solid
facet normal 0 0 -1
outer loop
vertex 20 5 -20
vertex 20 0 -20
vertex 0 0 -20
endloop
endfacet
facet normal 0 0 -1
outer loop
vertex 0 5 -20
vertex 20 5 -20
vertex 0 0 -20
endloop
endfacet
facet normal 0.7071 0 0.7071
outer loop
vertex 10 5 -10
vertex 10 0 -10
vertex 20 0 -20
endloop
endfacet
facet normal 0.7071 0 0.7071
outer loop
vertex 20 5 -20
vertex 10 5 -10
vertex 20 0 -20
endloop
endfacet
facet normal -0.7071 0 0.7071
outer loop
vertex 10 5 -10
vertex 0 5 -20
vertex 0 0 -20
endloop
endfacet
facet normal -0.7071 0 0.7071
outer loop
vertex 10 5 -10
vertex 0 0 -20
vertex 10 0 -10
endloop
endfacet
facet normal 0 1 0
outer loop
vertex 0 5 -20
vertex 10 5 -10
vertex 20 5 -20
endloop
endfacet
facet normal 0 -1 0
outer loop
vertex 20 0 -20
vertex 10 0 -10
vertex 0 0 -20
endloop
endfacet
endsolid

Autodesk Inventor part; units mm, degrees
ref_plane "YZ Plane" through (0, 0, 0) normal (1, 0, 0) x (0, 1, 0)
ref_plane "XZ Plane" through (0, 0, 0) normal (0, 1, 0) x (-1, 0, 0)
ref_plane "XY Plane" through (0, 0, 0) normal (0, 0, 1) x (1, 0, 0)
sketch "Szkic3" plane through (0, 0, 0) normal (0, 1, 0) x (-1, 0, 0)
  line L0 (0, 0) -> (-20, 0)
  line L1 (-20, 0) -> (-20, -20)
  line L2 (-20, -20) -> (0, -20)
  line L3 (0, -20) -> (0, 0)
  dimension "d6" = 20
  dimension "d7" = 20
extrude "Wyciągnięcie proste3" add sketch "Szkic3" along normal blind 5
sketch "Szkic4" plane through (0, 0, 0) normal (0, -1, 0) x (1, 0, 0)
  line L0 (0, 0) -> (20, 0) projected
  line L1 (20, 0) -> (20, -20) projected
  line L2 (0, 0) -> (20, -20)
  line L3 (20, -20) -> (20, 0)
  line L4 (20, 0) -> (0, 0)
extrude "Wyciągnięcie proste4" cut sketch "Szkic4" against normal blind 5
sketch "Szkic5" plane through (0, 5, 0) normal (0, 1, 0) x (1, 0, 0)
  line L0 (0, 20) -> (0, 0) projected
  line L1 (0, 20) -> (10.5726, 9.4274)
  line L2 (0, 0) -> (20, 20) projected
  line L3 (10.5726, 9.4274) -> (0, -1.1451)
  line L4 (20, 20) -> (0, 20) projected
  line L5 (0, -1.1451) -> (0, 20)
  point P0 (10, 10)
extrude "Wyciągnięcie proste5" cut sketch "Szkic5" against normal blind 10 contours L1 L2 L0
properties part number "Helenowiak_podpora"
